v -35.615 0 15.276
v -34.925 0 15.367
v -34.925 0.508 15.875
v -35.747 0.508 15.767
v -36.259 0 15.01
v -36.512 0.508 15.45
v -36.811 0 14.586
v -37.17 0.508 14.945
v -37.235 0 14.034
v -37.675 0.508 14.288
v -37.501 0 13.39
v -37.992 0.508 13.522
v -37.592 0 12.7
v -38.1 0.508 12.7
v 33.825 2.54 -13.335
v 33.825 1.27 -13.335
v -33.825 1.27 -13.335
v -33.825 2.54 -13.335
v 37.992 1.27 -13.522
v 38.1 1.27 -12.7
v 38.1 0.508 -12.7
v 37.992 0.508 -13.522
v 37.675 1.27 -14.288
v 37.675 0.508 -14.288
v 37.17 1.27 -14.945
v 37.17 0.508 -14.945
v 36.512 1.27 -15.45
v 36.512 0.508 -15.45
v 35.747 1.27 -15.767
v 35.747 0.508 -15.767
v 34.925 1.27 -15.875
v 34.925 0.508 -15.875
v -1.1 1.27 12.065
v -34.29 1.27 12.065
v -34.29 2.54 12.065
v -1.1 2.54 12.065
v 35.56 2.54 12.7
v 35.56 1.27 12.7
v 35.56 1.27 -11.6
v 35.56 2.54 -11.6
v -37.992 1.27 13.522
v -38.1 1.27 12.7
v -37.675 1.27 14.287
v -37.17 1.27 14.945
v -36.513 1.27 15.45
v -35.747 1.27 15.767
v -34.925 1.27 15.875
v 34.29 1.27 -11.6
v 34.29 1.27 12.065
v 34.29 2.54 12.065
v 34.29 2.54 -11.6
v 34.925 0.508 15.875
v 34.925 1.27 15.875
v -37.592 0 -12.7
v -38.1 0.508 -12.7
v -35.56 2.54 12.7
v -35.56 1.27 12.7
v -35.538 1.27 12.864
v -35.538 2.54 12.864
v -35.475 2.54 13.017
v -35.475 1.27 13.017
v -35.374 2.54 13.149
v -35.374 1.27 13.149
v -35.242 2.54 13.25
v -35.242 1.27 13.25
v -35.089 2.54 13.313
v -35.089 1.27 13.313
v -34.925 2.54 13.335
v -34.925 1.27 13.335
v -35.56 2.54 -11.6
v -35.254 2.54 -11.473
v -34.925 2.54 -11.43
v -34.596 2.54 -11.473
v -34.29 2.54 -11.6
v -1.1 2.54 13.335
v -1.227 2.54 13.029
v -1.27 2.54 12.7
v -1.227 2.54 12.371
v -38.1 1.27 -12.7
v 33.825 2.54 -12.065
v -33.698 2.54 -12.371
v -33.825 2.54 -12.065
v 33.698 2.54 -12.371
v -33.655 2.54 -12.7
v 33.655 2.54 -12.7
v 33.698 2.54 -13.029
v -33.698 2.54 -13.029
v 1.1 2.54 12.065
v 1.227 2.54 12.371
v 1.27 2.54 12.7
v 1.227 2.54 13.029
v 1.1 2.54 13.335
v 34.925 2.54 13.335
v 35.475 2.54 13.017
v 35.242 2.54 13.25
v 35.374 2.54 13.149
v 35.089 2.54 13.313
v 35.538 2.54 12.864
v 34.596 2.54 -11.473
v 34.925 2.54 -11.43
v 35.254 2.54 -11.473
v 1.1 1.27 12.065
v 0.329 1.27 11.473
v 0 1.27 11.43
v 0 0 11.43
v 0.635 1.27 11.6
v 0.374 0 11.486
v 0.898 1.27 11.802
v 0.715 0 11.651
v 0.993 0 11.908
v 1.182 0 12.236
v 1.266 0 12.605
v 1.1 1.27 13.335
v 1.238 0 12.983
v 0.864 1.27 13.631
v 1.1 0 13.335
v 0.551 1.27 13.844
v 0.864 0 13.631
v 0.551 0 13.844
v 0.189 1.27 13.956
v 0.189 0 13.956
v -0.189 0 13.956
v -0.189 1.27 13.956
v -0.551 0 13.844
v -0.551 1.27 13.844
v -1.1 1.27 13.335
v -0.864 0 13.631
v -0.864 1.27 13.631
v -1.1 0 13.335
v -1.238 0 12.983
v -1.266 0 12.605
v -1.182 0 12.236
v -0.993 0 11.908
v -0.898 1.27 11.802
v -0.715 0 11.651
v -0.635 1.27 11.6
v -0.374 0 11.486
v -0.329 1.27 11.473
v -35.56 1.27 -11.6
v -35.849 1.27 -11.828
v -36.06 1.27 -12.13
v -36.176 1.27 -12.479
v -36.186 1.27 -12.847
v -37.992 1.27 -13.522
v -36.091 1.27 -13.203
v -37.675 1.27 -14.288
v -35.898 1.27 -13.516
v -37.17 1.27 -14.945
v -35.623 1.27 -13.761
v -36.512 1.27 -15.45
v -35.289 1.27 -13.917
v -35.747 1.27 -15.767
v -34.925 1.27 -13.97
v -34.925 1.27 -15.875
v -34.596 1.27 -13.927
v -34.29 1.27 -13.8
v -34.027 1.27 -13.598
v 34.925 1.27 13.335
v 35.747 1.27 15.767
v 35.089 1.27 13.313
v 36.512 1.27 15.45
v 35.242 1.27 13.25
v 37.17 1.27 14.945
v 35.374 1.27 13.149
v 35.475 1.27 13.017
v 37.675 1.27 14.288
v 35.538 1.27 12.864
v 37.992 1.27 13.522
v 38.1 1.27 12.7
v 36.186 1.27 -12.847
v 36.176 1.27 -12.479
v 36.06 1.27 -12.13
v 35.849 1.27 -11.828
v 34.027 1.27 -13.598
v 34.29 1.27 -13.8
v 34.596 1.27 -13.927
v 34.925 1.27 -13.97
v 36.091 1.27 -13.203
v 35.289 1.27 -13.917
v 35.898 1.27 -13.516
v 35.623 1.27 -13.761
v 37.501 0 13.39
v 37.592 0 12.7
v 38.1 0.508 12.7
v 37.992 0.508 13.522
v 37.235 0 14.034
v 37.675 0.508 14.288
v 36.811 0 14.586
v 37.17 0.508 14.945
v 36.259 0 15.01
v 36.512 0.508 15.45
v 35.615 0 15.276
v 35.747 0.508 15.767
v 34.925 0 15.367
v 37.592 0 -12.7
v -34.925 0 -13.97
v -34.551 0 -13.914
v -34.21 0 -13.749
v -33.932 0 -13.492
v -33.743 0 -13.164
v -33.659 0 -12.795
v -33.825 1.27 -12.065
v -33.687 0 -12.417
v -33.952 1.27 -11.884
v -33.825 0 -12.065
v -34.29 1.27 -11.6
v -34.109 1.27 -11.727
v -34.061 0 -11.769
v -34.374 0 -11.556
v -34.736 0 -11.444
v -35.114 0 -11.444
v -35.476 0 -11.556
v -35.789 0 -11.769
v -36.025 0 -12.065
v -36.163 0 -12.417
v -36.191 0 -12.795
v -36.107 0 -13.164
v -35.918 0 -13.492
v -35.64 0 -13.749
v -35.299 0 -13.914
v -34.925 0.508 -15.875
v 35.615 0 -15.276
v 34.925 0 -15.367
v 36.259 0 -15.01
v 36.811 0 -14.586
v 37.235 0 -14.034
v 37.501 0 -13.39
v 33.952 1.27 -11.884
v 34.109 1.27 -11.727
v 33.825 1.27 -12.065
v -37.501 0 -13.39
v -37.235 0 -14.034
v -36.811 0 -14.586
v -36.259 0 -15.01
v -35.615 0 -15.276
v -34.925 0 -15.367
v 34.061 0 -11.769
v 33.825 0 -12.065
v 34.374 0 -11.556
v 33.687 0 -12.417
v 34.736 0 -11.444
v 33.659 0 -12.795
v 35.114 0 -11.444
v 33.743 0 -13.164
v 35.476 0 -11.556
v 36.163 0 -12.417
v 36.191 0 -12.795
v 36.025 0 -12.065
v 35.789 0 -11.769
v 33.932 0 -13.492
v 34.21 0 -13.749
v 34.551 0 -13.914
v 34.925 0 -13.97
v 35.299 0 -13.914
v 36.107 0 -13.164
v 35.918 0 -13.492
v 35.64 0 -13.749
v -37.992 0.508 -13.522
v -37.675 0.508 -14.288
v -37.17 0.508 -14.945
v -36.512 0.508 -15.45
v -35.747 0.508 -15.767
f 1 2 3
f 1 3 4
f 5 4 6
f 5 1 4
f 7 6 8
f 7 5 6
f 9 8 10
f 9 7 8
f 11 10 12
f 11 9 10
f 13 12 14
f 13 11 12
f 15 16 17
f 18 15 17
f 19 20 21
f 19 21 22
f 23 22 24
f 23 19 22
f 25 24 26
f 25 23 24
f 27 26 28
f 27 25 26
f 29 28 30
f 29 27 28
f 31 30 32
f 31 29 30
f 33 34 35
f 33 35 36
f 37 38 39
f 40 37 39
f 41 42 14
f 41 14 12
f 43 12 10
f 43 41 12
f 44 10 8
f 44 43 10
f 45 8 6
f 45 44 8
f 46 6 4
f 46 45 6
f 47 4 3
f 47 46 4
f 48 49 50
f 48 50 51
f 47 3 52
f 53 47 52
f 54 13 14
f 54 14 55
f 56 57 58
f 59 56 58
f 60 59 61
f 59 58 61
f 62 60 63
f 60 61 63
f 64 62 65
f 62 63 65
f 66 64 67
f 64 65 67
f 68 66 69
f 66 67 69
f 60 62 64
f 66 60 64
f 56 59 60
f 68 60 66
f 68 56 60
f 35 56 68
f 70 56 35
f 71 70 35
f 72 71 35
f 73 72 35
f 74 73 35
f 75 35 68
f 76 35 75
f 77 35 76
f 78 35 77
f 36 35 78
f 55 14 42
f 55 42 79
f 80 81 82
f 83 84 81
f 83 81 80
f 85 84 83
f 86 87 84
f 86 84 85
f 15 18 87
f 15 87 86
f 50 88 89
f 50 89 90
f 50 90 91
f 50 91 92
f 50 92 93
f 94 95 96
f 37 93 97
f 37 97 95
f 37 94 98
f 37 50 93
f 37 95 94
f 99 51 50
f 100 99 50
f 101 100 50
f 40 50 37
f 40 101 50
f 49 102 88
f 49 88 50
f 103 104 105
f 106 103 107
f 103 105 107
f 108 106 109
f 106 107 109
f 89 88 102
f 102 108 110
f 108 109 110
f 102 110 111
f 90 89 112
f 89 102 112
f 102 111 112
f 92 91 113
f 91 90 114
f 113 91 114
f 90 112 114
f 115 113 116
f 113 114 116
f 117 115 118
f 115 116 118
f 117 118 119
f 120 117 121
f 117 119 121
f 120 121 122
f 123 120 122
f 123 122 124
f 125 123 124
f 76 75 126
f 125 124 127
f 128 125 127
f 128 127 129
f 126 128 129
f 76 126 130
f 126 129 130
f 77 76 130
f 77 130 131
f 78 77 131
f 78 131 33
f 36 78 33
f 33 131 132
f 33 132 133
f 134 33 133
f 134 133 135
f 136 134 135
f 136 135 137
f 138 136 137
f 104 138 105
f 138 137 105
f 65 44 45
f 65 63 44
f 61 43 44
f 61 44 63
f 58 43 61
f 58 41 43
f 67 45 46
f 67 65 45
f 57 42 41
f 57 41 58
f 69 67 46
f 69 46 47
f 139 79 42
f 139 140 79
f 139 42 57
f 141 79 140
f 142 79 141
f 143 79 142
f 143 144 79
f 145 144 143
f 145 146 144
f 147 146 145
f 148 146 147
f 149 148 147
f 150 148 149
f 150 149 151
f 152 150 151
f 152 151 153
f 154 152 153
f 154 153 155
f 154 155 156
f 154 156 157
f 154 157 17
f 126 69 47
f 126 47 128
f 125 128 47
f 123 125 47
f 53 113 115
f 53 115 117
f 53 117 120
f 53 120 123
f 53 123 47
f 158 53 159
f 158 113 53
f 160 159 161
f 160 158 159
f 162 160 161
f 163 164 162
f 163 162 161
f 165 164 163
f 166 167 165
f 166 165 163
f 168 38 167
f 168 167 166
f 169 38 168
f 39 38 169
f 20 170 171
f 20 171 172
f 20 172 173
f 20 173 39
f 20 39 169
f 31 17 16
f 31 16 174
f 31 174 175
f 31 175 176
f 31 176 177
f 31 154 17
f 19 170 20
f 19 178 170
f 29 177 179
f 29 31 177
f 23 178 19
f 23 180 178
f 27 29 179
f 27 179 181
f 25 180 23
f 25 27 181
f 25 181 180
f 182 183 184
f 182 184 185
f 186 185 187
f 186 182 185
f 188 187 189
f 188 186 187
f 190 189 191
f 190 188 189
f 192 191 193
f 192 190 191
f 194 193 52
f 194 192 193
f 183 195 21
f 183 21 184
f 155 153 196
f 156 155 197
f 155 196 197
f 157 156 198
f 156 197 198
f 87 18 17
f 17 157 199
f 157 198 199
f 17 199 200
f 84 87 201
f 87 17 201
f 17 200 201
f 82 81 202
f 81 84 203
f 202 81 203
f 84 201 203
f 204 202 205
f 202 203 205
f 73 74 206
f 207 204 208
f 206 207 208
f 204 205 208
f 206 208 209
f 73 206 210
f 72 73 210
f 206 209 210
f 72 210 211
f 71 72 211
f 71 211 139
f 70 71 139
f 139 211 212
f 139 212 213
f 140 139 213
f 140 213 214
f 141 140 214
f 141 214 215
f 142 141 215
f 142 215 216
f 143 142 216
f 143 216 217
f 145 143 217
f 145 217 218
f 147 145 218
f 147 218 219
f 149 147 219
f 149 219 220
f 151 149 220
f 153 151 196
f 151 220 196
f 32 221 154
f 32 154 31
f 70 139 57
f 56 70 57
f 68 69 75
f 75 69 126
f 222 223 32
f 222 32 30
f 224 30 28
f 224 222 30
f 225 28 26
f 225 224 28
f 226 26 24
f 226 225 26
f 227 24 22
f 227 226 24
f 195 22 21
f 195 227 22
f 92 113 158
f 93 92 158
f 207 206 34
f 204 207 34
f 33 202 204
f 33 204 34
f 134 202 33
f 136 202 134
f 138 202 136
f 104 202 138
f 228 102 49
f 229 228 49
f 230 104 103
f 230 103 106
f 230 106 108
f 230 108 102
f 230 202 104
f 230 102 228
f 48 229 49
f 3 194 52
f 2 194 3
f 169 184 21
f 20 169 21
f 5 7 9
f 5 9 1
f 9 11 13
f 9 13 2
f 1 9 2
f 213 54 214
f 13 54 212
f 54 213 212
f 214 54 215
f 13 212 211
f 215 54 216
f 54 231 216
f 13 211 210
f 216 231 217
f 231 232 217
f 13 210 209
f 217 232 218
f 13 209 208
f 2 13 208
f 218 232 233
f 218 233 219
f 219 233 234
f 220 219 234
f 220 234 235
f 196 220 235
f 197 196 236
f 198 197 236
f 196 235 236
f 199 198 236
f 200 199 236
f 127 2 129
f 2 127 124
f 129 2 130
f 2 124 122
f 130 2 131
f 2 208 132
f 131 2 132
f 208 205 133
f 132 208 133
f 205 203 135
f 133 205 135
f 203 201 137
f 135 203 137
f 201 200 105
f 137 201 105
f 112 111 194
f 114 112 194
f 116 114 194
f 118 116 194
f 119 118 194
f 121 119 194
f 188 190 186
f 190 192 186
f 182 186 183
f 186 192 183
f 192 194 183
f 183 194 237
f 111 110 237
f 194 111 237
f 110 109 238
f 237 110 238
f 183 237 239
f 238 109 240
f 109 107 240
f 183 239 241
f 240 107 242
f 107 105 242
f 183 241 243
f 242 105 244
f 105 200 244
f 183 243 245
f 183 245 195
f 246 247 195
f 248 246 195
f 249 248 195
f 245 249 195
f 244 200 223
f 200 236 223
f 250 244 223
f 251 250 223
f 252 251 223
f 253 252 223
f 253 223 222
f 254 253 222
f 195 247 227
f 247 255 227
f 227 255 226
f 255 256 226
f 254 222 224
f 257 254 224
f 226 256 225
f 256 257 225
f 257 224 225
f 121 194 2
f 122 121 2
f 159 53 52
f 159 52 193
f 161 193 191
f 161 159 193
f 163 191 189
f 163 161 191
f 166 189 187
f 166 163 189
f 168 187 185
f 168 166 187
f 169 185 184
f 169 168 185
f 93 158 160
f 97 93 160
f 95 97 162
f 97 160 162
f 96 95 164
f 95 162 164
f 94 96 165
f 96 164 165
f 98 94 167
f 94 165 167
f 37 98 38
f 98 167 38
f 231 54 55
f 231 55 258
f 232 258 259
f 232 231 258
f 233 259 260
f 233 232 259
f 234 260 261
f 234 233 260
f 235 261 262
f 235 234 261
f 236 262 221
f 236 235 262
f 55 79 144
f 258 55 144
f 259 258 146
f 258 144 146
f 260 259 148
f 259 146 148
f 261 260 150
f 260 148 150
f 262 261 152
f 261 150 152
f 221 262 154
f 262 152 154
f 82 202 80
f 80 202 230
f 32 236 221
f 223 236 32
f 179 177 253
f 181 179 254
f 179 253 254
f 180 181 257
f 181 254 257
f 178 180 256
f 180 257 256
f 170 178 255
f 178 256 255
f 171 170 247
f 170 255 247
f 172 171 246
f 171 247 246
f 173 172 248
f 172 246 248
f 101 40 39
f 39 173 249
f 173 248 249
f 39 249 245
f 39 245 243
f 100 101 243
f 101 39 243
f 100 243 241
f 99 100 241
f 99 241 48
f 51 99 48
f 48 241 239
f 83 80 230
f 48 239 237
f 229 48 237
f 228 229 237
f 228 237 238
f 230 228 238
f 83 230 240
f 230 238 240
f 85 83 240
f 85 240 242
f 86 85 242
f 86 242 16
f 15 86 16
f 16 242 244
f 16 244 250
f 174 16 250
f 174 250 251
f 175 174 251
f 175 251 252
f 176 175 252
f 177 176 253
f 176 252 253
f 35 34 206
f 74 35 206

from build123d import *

# Parameters (mm, degrees)
SKETCH1_W           = 76.2
SKETCH1_H           = 31.75
BOSS_EXTRUDE1_DEPTH = 1.27
FILLET1_R           = 3.175
SKETCH2_W           = 68.58
SKETCH2_H           = 24.13
BOSS_EXTRUDE2_DEPTH = 1.27
SKETCH3_R           = 1.27
CUT_EXTRUDE1_DEPTH  = 42.353079994
CHAMFER1_SIZE       = 0.508


with BuildPart() as part:
    # Sketch1 → Boss-Extrude1 (new body)
    with BuildSketch(Plane(origin=(0, 0, 0), x_dir=(1, 0, 0), z_dir=(0, 1, 0))):
        Rectangle(SKETCH1_W, SKETCH1_H)
    extrude(amount=BOSS_EXTRUDE1_DEPTH)

    # Fillet1
    fillet1_edges = [part.edges().sort_by_distance(p)[0] for p in [
        (-38.1, 0.635, -15.875),
        (38.1, 0.635, -15.875),
        (38.1, 0.635, 15.875),
        (-38.1, 0.635, 15.875),
    ]]
    fillet(fillet1_edges, radius=FILLET1_R)

    # Sketch2 → Boss-Extrude2 (add)
    with BuildSketch(Plane(origin=(0, 1.27, 0), x_dir=(1, 0, 0), z_dir=(0, 1, 0))):
        with BuildLine():
            Line((34.925, 13.335), (-34.925, 13.335))
            ThreePointArc((-34.925, 13.335), (-35.374012806, 13.149012806), (-35.56, 12.7))
            Line((-35.56, 12.7), (-35.56, -12.7))
            ThreePointArc((-35.56, -12.7), (-35.374012806, -13.149012806), (-34.925, -13.335))
            Line((-34.925, -13.335), (34.925, -13.335))
            ThreePointArc((34.925, -13.335), (35.374012806, -13.149012806), (35.56, -12.7))
            Line((35.56, -12.7), (35.56, 12.7))
            ThreePointArc((35.56, 12.7), (35.374012806, 13.149012806), (34.925, 13.335))
        make_face()
        Rectangle(SKETCH2_W, SKETCH2_H, mode=Mode.SUBTRACT)
    extrude(amount=BOSS_EXTRUDE2_DEPTH)

    # Sketch3 → Cut-Extrude1 (cut, through all)
    with BuildSketch(Plane.XZ):
        with Locations(Location((34.925, -12.7, 0), (0, 0, 270))):
            Circle(SKETCH3_R)
        with Locations(Location((0, 12.7, 0), (0, 0, 270))):
            Circle(SKETCH3_R)
        with Locations(Location((-34.925, -12.7, 0), (0, 0, 270))):
            Circle(SKETCH3_R)
    extrude(amount=-CUT_EXTRUDE1_DEPTH, mode=Mode.SUBTRACT)

    # Chamfer1
    chamfer1_edges = [part.edges().sort_by_distance(p)[0] for p in [
        (-38.1, 0, 0),
        (0, 0, -15.875),
        (38.1, 0, 0),
        (0, 0, 15.875),
        (-37.17006403, 0, 14.94506403),
        (37.17006403, 0, 14.94506403),
        (37.17006403, 0, -14.94506403),
        (-37.17006403, 0, -14.94506403),
    ]]
    chamfer(chamfer1_edges, length=CHAMFER1_SIZE)


solid = part.part
